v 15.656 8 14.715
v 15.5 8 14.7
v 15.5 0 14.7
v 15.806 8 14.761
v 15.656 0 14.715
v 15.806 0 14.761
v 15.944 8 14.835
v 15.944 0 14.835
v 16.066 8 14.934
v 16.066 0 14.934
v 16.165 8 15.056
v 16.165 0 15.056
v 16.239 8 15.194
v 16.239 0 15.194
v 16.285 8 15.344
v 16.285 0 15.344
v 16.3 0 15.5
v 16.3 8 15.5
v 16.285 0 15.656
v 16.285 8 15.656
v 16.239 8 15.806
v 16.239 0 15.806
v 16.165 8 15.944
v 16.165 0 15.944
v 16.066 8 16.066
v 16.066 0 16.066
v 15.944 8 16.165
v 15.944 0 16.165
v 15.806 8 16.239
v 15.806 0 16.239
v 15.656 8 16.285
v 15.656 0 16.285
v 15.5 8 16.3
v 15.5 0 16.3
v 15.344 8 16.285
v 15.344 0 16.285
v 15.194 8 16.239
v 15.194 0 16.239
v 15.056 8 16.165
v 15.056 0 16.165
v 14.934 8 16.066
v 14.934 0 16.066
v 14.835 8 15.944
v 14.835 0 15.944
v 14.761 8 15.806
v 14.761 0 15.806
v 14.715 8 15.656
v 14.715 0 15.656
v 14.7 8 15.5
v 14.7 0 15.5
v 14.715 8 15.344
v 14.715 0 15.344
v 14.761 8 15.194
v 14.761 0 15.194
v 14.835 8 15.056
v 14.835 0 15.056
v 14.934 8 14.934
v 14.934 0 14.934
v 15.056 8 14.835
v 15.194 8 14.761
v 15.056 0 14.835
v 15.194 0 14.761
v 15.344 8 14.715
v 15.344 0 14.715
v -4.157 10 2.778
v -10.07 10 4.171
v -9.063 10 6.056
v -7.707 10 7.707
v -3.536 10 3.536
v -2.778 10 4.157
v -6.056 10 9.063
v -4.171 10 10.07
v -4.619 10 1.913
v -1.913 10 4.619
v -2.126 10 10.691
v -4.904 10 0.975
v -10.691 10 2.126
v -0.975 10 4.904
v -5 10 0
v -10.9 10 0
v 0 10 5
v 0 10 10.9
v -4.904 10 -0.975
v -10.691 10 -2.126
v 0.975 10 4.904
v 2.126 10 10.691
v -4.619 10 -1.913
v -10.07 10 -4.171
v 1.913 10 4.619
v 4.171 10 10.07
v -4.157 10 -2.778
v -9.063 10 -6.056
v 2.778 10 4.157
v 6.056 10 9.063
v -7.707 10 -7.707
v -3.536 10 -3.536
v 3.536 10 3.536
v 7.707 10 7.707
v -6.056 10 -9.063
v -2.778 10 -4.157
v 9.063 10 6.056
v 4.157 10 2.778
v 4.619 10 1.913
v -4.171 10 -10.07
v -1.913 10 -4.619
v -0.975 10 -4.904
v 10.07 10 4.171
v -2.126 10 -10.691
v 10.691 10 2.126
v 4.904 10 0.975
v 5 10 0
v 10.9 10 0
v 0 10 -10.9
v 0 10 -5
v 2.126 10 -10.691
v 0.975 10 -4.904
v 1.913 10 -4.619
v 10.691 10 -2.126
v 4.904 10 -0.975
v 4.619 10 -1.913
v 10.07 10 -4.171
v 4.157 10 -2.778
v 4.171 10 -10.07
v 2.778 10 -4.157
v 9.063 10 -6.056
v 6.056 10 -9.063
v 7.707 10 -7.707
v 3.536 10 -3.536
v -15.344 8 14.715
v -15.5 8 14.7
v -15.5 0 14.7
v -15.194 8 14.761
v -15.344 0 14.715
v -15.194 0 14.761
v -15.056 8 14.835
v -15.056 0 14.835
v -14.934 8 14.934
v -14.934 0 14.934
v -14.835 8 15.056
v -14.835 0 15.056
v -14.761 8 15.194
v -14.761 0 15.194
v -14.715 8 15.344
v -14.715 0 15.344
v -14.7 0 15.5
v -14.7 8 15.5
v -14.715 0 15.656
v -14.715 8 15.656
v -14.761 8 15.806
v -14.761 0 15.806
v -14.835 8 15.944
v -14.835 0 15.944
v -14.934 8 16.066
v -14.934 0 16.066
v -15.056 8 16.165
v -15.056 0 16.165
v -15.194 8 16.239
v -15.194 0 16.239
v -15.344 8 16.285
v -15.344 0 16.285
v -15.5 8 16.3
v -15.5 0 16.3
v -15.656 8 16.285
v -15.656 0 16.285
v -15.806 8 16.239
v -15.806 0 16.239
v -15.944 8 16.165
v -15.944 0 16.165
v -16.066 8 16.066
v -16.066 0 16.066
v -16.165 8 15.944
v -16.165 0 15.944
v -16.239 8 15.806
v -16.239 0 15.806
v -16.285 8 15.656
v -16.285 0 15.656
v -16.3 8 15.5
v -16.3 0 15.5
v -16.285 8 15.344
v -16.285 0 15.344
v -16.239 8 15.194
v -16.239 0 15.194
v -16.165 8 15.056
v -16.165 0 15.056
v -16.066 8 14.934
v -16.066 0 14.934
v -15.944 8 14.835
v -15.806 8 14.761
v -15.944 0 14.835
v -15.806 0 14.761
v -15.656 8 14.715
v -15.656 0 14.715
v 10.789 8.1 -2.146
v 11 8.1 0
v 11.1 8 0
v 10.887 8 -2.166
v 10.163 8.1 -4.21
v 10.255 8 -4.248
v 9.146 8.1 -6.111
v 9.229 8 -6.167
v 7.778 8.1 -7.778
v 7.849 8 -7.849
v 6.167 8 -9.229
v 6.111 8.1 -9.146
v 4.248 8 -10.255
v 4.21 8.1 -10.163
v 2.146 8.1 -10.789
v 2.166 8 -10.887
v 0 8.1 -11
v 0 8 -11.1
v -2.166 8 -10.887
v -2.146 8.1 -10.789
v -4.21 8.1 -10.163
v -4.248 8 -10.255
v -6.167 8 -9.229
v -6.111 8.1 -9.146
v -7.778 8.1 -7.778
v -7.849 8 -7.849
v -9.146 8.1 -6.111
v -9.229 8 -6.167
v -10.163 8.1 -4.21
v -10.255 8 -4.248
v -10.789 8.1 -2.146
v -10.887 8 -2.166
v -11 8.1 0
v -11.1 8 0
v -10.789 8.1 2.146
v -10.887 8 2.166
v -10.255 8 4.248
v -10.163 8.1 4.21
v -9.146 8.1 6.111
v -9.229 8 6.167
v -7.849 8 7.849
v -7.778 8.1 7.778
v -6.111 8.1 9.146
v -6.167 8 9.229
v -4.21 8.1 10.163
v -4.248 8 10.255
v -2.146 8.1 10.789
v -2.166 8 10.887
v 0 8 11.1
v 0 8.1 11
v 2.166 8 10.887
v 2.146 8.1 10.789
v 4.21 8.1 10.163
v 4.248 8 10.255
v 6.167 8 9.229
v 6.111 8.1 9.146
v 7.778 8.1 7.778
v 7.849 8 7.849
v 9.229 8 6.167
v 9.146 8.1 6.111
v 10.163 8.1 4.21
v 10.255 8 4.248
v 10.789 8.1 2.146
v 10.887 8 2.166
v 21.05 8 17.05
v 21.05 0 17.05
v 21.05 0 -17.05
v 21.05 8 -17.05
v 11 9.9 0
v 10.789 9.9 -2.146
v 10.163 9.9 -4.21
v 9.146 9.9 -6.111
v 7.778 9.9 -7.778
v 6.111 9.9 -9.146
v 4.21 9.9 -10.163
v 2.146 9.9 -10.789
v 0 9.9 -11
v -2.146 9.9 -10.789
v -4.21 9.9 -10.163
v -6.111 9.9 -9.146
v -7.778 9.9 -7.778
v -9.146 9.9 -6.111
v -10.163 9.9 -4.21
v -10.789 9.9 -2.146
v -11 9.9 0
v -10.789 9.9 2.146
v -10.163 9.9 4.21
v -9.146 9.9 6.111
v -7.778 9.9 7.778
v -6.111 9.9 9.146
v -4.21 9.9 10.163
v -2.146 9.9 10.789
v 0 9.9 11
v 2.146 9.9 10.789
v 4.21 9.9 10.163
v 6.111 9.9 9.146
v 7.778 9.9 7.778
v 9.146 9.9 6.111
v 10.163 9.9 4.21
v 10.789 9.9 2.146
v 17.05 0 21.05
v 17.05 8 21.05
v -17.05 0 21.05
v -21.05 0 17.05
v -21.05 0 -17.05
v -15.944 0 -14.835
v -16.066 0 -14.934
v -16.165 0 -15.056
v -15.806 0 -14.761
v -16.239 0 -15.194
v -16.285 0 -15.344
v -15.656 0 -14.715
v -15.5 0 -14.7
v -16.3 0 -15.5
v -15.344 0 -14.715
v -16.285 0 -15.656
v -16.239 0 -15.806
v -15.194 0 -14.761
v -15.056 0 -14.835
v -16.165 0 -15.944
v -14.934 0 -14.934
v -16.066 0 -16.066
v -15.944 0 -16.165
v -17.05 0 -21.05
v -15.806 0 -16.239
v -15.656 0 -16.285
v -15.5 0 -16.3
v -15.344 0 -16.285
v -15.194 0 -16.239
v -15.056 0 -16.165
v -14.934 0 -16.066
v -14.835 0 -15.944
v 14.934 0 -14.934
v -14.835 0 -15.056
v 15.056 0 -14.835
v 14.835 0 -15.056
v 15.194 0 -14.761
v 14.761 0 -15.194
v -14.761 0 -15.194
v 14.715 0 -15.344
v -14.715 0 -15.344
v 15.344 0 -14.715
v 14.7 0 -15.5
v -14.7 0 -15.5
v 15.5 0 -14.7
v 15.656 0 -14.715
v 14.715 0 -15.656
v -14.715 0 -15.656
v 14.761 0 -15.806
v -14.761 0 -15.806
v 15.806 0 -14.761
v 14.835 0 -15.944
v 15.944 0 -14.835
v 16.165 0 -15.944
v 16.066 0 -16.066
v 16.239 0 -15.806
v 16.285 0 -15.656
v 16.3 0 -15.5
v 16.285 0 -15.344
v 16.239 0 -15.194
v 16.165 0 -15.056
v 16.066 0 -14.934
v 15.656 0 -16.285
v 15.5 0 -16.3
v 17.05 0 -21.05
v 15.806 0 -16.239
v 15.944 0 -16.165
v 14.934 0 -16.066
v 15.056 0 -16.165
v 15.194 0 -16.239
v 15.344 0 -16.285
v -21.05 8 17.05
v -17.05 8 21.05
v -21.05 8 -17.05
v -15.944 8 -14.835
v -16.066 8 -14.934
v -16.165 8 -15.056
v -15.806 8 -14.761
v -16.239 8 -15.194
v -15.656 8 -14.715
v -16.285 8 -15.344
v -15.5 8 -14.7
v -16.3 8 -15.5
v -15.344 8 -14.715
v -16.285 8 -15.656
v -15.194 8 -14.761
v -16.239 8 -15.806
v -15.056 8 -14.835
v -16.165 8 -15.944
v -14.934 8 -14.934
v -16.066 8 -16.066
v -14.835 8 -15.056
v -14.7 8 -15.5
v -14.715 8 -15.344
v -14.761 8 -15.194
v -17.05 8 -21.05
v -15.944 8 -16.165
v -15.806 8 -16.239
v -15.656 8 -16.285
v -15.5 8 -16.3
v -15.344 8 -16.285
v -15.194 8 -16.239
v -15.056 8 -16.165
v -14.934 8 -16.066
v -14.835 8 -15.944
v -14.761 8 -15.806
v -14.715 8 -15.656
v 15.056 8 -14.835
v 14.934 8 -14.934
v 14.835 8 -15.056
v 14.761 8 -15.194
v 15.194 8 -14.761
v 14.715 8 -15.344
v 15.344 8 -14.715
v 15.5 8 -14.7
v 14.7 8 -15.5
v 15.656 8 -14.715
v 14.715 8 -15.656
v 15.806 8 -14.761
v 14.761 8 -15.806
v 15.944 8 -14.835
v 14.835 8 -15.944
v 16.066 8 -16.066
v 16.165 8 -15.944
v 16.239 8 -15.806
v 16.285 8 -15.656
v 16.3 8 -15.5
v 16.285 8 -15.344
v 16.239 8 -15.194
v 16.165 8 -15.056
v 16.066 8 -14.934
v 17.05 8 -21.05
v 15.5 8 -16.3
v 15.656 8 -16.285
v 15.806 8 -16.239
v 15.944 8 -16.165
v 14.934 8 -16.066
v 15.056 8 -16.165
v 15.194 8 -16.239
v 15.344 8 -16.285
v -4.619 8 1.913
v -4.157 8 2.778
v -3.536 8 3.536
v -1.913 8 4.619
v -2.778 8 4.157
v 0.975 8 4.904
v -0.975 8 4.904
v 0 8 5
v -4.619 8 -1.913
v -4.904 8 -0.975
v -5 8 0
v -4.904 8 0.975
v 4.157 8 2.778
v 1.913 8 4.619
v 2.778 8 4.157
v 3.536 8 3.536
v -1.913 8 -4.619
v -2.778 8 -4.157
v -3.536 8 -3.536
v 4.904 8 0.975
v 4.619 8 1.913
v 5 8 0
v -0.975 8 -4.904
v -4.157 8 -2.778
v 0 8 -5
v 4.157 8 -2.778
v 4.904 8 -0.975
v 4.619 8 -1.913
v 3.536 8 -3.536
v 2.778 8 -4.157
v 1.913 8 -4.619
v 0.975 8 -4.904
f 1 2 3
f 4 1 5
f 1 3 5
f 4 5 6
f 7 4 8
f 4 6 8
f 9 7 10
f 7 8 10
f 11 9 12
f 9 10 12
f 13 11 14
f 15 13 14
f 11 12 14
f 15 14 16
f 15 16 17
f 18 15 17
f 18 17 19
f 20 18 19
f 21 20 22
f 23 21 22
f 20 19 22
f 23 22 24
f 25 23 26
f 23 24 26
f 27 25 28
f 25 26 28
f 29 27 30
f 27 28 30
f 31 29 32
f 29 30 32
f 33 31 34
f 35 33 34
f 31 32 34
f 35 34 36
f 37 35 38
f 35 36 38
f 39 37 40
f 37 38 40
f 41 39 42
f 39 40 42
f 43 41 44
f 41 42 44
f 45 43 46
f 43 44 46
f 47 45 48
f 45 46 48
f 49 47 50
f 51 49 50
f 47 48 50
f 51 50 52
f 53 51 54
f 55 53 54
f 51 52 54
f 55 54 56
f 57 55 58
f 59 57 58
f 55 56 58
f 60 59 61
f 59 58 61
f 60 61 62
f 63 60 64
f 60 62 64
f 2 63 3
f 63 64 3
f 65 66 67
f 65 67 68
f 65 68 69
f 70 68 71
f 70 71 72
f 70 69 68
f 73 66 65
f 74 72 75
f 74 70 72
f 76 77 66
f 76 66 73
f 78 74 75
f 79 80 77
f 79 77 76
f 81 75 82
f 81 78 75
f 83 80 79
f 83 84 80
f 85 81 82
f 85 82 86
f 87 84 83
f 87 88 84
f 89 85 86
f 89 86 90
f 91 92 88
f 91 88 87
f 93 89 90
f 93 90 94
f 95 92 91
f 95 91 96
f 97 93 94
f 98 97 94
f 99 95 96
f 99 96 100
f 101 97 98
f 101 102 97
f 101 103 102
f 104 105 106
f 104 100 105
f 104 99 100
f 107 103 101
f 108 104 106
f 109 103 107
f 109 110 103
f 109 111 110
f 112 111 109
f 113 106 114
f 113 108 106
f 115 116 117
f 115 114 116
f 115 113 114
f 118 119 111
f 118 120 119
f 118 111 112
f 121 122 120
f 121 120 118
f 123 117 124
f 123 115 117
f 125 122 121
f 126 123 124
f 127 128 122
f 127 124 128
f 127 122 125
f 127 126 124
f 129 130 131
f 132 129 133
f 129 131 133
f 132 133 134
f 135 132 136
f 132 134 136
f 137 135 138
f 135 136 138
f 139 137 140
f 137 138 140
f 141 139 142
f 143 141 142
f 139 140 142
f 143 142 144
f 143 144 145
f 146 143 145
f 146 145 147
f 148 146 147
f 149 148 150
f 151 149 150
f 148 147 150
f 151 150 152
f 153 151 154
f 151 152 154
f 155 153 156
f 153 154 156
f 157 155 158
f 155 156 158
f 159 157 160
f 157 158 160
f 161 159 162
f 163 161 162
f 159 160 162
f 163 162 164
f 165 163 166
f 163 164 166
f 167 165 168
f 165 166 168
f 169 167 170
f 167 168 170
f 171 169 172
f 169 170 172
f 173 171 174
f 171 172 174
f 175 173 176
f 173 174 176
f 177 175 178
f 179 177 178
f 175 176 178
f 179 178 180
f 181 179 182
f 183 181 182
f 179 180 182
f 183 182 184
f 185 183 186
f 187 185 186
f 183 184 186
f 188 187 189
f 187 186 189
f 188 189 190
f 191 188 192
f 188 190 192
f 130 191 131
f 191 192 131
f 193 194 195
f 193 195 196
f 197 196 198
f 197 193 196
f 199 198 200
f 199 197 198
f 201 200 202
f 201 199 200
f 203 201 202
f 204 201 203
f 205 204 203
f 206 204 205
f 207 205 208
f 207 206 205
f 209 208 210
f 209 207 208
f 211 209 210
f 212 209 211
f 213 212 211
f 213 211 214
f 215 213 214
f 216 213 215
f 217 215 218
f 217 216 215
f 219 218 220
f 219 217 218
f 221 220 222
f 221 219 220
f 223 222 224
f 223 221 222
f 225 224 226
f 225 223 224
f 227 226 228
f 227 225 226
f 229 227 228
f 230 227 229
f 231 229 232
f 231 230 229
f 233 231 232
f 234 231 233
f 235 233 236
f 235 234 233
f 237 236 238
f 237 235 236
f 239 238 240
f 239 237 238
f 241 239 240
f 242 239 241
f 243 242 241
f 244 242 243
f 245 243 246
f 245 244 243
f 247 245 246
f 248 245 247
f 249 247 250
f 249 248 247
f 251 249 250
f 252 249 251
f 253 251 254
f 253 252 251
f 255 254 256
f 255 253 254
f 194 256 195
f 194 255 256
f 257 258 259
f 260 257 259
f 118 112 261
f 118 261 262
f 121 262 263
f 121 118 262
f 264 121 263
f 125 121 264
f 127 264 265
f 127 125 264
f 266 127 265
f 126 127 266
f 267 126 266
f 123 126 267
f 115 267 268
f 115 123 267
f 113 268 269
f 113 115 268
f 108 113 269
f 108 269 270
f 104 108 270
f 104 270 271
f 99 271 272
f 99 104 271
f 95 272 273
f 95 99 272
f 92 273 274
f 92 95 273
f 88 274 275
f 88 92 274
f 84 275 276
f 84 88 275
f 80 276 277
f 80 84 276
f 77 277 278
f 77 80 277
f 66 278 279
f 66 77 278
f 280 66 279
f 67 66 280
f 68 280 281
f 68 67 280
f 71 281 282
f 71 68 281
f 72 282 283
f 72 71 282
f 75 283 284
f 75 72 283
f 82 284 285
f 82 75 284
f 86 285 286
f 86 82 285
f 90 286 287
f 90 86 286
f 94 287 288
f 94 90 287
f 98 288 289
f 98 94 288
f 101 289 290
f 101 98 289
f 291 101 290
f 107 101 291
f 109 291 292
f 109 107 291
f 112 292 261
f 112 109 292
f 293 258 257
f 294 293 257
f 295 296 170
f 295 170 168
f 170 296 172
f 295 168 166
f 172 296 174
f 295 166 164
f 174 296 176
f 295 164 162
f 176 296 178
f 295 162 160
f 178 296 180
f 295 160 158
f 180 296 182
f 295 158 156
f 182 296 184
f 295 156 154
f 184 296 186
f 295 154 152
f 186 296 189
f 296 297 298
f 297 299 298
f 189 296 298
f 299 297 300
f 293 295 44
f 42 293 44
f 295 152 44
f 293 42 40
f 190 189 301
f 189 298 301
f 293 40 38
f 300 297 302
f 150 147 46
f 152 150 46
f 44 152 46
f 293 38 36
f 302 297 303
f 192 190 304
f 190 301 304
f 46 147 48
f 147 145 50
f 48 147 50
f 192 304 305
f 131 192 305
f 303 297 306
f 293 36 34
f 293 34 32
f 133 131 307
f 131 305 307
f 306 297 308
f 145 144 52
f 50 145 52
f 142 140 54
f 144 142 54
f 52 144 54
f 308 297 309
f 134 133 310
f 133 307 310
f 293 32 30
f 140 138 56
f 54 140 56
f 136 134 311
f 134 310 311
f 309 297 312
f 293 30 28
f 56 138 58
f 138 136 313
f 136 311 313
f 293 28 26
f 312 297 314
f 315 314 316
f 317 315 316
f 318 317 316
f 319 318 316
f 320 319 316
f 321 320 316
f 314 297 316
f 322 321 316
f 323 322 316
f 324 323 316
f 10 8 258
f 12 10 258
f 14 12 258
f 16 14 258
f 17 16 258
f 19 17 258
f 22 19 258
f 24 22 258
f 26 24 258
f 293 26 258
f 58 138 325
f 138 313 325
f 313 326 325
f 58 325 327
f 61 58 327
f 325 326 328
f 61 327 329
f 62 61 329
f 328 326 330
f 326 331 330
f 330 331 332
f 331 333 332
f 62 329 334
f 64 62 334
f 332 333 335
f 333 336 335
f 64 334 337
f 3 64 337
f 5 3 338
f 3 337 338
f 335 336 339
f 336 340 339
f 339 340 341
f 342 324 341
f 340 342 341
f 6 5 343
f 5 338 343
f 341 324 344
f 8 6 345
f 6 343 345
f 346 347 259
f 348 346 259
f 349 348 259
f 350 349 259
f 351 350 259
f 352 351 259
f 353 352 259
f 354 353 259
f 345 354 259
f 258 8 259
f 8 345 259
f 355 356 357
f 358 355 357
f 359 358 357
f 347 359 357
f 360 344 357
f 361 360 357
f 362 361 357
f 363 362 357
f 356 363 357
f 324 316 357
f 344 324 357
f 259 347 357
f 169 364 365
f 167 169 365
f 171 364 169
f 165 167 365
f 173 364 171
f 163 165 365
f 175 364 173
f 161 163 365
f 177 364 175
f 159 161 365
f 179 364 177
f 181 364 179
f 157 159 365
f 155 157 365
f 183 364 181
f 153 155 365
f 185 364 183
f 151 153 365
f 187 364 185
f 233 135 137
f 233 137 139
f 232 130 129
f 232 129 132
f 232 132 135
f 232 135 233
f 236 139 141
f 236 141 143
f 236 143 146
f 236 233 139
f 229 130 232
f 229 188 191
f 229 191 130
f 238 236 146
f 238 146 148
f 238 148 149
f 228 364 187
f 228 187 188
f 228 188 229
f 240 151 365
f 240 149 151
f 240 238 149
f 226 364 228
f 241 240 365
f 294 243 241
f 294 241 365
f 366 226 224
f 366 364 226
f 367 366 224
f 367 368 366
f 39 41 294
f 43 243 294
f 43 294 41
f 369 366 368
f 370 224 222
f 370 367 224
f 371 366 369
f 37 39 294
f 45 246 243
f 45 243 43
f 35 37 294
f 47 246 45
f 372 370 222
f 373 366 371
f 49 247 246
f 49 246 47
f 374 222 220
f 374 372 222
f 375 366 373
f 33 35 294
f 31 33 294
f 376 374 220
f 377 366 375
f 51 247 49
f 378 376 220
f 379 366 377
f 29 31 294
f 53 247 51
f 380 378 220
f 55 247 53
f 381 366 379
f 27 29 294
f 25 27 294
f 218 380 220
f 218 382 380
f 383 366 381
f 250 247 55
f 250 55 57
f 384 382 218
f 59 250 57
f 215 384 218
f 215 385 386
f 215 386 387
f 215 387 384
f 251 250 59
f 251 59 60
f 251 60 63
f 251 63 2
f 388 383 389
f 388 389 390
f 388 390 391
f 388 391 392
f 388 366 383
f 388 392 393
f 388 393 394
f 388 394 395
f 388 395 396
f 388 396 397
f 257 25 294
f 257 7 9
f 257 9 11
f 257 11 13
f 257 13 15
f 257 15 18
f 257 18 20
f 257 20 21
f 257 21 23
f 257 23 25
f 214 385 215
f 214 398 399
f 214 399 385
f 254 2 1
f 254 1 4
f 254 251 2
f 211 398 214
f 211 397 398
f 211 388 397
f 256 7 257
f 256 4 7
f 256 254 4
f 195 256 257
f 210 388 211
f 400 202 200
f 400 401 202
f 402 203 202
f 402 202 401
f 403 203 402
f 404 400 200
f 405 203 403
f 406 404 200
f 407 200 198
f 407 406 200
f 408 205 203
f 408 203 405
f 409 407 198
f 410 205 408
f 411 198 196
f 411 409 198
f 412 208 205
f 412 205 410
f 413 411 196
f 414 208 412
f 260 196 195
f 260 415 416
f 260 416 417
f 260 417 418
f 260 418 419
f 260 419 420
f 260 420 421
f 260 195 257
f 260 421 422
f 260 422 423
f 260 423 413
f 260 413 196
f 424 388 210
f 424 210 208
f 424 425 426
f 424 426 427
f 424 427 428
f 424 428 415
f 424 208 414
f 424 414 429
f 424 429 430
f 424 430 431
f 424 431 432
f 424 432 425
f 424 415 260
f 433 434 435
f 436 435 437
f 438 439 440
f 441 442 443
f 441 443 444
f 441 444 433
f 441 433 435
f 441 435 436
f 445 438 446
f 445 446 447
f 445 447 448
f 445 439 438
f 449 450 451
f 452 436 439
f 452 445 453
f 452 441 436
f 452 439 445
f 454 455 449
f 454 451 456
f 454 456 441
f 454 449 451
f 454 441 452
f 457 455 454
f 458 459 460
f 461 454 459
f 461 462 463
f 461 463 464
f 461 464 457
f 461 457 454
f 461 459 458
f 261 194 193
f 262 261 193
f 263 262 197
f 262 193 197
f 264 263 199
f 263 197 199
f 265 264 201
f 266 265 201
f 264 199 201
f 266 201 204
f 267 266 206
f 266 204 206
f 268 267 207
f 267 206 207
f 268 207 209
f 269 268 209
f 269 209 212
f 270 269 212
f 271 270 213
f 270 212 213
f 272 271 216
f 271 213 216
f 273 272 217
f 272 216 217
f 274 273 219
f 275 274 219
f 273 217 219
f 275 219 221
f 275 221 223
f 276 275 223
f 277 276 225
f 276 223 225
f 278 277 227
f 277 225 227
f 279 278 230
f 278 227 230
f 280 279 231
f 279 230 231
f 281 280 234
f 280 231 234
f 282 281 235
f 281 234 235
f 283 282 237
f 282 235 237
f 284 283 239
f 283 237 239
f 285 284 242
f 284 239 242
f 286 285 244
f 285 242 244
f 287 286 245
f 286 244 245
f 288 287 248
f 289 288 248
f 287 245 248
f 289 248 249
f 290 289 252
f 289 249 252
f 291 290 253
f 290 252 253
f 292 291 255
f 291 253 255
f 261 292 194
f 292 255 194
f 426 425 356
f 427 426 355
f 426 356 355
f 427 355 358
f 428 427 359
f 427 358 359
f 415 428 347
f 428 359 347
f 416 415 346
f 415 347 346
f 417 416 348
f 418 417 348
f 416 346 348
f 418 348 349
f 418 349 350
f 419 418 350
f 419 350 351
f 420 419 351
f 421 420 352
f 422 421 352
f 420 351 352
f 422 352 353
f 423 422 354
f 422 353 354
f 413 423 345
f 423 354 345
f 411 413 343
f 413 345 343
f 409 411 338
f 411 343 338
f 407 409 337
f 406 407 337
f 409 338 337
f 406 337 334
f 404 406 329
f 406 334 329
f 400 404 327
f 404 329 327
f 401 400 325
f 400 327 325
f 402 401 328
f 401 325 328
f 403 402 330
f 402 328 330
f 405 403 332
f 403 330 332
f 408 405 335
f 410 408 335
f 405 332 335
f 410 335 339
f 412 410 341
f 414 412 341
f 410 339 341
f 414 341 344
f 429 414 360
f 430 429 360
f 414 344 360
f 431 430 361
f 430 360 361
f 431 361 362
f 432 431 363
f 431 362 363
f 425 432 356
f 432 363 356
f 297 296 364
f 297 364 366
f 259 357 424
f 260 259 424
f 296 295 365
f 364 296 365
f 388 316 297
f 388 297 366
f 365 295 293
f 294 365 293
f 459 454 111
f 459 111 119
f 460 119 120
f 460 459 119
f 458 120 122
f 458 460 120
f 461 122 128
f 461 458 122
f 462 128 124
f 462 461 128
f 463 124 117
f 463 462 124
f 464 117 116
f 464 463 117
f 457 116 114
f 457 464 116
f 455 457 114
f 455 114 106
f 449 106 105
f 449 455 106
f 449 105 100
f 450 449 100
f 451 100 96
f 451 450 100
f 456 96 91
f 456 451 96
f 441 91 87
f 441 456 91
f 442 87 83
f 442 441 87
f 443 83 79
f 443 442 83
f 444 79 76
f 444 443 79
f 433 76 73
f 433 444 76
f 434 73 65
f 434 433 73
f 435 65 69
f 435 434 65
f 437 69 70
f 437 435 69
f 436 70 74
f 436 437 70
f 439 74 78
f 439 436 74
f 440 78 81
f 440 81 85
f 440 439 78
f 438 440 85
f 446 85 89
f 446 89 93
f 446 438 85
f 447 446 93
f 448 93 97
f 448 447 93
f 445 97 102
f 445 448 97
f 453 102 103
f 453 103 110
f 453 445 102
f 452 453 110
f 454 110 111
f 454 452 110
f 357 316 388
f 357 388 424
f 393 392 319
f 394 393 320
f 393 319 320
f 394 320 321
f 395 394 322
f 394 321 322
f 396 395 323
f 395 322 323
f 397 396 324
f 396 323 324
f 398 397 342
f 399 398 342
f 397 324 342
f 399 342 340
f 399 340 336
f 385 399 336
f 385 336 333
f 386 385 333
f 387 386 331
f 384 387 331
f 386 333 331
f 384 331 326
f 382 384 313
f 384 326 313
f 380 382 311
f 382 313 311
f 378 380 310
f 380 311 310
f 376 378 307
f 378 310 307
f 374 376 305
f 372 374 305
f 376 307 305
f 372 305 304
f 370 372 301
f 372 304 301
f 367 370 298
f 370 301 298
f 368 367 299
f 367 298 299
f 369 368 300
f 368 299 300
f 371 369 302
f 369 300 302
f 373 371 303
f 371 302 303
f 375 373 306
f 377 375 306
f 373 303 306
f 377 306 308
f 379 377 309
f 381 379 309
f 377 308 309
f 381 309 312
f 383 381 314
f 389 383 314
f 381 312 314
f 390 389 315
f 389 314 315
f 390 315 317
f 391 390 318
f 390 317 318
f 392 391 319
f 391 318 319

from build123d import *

# Parameters (mm, degrees)
SKETCH1_W                 = 42.1
SKETCH1_H                 = 42.1
BOSS_EXTRUDE1_DEPTH       = 8
CHAMFER1_SIZE             = 4
SKETCH2_R                 = 11
SKETCH2_R_2               = 5
BOSS_EXTRUDE2_DEPTH       = 2
CHAMFER2_SIZE             = 0.1
M2X0_4_TAPPED_HOLE1_D     = 1.6
M2X0_4_TAPPED_HOLE1_DEPTH = 8
M2X0_4_TAPPED_HOLE1_TIP   = 0.480688495


with BuildPart() as part:
    # Sketch1 → Boss-Extrude1 (new body)
    with BuildSketch(Plane(origin=(0, 0, 0), x_dir=(1, 0, 0), z_dir=(0, 1, 0))):
        Rectangle(SKETCH1_W, SKETCH1_H)
    extrude(amount=BOSS_EXTRUDE1_DEPTH)

    # Chamfer1
    chamfer1_edges = [part.edges().sort_by_distance(p)[0] for p in [
        (21.05, 4, 21.05),
        (-21.05, 4, 21.05),
        (-21.05, 4, -21.05),
        (21.05, 4, -21.05),
    ]]
    chamfer(chamfer1_edges, length=CHAMFER1_SIZE)

    # Sketch2 → Boss-Extrude2 (add)
    with BuildSketch(Plane(origin=(0, 8, 0), x_dir=(1, 0, 0), z_dir=(0, 1, 0))):
        Circle(SKETCH2_R)
        Circle(SKETCH2_R_2, mode=Mode.SUBTRACT)
    extrude(amount=BOSS_EXTRUDE2_DEPTH)

    # Chamfer2
    chamfer2_edges = [part.edges().sort_by_distance(p)[0] for p in [
        (-11, 8, 0),
        (-11, 10, 0),
    ]]
    chamfer(chamfer2_edges, length=CHAMFER2_SIZE)

    # M2x0.4 Tapped Hole1
    with Locations(Plane(origin=(-15.5, 8, -15.5), x_dir=(0, 0, 1), z_dir=(0, 1, 0))):
        with Locations((0, 0), (0, 31), (31, 31), (31, 0)):
            Hole(M2X0_4_TAPPED_HOLE1_D / 2, depth=M2X0_4_TAPPED_HOLE1_DEPTH)
            with Locations((0, 0, -(M2X0_4_TAPPED_HOLE1_DEPTH + M2X0_4_TAPPED_HOLE1_TIP / 2))):  # 118° drill point
                Cone(0, M2X0_4_TAPPED_HOLE1_D / 2, M2X0_4_TAPPED_HOLE1_TIP, mode=Mode.SUBTRACT)


solid = part.part
